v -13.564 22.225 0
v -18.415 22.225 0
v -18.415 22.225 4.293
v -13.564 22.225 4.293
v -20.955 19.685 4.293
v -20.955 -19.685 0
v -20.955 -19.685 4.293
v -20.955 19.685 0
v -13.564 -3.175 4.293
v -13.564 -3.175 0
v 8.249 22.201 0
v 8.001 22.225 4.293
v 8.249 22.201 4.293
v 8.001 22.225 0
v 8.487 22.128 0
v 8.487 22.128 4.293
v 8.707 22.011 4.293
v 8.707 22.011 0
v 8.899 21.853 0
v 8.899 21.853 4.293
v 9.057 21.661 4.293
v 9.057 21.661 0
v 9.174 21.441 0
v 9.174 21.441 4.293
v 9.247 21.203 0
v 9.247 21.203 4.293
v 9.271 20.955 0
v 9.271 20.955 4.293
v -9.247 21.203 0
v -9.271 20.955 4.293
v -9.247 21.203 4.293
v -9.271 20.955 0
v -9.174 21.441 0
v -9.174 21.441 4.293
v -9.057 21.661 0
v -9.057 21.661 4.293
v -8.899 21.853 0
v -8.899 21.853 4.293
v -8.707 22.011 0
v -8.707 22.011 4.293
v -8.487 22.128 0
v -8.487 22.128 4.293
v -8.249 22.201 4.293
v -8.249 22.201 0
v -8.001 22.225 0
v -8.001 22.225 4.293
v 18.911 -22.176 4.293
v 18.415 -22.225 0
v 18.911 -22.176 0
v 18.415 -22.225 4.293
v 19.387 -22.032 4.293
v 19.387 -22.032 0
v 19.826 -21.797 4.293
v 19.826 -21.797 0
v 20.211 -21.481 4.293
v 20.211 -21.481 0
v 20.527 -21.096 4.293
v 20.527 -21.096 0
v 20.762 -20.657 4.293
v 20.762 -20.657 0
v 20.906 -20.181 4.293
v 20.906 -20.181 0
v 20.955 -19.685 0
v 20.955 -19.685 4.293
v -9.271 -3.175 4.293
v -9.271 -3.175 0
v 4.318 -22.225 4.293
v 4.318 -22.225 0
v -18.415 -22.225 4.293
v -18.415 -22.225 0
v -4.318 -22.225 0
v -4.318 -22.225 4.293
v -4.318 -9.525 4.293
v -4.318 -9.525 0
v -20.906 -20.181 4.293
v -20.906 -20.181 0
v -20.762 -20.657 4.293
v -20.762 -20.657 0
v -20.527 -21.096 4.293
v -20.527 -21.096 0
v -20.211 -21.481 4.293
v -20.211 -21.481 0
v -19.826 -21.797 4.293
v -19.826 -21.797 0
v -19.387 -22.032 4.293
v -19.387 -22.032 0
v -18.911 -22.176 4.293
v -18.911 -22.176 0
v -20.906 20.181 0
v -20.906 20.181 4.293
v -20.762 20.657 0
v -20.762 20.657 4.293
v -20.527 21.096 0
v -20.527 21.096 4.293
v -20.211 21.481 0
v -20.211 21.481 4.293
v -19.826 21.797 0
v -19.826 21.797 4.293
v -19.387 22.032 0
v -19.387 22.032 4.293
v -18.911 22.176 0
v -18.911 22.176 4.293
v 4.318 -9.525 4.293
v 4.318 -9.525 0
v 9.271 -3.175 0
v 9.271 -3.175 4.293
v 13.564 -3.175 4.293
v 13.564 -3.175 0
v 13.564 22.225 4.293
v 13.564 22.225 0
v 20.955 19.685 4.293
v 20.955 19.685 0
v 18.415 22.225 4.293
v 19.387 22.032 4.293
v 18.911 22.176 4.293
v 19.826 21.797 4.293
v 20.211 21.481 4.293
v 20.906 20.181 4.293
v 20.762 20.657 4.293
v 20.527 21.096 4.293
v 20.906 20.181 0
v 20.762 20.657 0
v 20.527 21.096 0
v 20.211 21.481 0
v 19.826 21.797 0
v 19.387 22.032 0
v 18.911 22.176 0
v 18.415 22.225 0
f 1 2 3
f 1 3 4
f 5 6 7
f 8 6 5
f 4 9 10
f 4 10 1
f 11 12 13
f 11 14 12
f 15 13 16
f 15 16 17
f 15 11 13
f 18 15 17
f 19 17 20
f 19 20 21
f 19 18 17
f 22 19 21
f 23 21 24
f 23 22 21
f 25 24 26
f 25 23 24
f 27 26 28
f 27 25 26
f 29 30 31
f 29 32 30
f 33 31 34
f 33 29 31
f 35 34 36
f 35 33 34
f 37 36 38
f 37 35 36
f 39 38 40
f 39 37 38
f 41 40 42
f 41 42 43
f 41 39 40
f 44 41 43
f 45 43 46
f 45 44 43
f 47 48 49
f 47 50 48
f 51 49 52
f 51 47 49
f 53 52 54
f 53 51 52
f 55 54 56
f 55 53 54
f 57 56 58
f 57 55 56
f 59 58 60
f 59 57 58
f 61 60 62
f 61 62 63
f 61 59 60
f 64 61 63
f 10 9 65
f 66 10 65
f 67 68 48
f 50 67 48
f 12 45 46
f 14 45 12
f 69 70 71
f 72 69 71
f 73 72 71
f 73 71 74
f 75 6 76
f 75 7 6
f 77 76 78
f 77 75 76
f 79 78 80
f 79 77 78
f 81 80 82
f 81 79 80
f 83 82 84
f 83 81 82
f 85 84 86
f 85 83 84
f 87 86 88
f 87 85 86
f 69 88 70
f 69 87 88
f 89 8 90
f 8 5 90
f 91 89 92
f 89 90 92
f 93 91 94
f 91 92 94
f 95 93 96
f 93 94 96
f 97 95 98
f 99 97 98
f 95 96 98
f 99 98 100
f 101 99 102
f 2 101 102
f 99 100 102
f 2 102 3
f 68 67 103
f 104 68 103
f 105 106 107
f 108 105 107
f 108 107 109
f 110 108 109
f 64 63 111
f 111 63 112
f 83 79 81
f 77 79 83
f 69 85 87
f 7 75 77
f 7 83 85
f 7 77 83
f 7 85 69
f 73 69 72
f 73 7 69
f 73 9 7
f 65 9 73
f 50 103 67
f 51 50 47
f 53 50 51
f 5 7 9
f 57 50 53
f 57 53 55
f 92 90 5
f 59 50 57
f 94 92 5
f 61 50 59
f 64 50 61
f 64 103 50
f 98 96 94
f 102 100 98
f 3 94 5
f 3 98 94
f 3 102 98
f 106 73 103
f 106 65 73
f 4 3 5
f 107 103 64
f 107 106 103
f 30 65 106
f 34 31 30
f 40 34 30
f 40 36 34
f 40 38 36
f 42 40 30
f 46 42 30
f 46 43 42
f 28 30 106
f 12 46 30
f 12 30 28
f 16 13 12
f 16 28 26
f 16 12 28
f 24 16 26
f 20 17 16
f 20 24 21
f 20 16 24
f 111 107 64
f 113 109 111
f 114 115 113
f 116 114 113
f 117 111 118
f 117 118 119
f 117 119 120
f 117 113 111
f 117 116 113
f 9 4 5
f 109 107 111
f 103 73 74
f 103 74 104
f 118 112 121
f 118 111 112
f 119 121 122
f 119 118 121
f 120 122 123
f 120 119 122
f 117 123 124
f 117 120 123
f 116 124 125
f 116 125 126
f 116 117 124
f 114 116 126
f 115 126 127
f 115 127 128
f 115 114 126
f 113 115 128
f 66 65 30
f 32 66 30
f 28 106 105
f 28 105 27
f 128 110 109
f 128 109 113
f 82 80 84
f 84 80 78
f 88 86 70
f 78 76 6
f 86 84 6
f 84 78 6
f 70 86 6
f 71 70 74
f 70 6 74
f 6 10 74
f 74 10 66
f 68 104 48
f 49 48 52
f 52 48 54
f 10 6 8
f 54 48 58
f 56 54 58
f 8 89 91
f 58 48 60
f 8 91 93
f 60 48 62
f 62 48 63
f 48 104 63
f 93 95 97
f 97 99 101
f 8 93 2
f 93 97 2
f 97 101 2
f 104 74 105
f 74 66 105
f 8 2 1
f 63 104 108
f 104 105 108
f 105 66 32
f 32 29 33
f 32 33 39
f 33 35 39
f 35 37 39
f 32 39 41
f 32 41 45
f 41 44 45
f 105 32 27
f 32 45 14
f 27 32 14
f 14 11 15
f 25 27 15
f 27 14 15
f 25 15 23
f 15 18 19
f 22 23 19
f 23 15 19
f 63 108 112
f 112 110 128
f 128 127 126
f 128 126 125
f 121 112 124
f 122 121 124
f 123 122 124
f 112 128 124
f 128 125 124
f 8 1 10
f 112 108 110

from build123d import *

# Parameters (mm, degrees)
SKETCH1_W           = 41.91
SKETCH1_H           = 44.45
BOSS_EXTRUDE1_DEPTH = 4.2926
FILLET1_R           = 2.54
SKETCH2_W           = 4.2926
SKETCH2_H           = 25.4
SKETCH2_W_2         = 8.636
SKETCH2_H_2         = 12.7
CUT_EXTRUDE2_DEPTH  = 4.2926
FILLET3_R           = 1.27


with BuildPart() as part:
    # Sketch1 → Boss-Extrude1 (new body)
    with BuildSketch(Plane.XY):
        Rectangle(SKETCH1_W, SKETCH1_H)
    extrude(amount=BOSS_EXTRUDE1_DEPTH)

    # Fillet1
    fillet1_edges = [part.edges().sort_by_distance(p)[0] for p in [
        (20.955, -22.225, 2.1463),
        (-20.955, -22.225, 2.1463),
        (-20.955, 22.225, 2.1463),
        (20.955, 22.225, 2.1463),
    ]]
    fillet(fillet1_edges, radius=FILLET1_R)

    # Sketch2 → Cut-Extrude2 (cut)
    with BuildSketch(Plane.XY.offset(4.2926)):
        with Locations((-11.4173, 9.525)):
            Rectangle(SKETCH2_W, SKETCH2_H)
        with Locations((11.4173, 9.525)):
            Rectangle(SKETCH2_W, SKETCH2_H)
        with Locations((0, -15.875)):
            Rectangle(SKETCH2_W_2, SKETCH2_H_2)
    extrude(amount=-CUT_EXTRUDE2_DEPTH, mode=Mode.SUBTRACT)

    # Fillet3
    fillet3_edges = [part.edges().sort_by_distance(p)[0] for p in [
        (-9.271, 22.225, 2.1463),
        (9.271, 22.225, 2.1463),
    ]]
    fillet(fillet3_edges, radius=FILLET3_R)


solid = part.part
